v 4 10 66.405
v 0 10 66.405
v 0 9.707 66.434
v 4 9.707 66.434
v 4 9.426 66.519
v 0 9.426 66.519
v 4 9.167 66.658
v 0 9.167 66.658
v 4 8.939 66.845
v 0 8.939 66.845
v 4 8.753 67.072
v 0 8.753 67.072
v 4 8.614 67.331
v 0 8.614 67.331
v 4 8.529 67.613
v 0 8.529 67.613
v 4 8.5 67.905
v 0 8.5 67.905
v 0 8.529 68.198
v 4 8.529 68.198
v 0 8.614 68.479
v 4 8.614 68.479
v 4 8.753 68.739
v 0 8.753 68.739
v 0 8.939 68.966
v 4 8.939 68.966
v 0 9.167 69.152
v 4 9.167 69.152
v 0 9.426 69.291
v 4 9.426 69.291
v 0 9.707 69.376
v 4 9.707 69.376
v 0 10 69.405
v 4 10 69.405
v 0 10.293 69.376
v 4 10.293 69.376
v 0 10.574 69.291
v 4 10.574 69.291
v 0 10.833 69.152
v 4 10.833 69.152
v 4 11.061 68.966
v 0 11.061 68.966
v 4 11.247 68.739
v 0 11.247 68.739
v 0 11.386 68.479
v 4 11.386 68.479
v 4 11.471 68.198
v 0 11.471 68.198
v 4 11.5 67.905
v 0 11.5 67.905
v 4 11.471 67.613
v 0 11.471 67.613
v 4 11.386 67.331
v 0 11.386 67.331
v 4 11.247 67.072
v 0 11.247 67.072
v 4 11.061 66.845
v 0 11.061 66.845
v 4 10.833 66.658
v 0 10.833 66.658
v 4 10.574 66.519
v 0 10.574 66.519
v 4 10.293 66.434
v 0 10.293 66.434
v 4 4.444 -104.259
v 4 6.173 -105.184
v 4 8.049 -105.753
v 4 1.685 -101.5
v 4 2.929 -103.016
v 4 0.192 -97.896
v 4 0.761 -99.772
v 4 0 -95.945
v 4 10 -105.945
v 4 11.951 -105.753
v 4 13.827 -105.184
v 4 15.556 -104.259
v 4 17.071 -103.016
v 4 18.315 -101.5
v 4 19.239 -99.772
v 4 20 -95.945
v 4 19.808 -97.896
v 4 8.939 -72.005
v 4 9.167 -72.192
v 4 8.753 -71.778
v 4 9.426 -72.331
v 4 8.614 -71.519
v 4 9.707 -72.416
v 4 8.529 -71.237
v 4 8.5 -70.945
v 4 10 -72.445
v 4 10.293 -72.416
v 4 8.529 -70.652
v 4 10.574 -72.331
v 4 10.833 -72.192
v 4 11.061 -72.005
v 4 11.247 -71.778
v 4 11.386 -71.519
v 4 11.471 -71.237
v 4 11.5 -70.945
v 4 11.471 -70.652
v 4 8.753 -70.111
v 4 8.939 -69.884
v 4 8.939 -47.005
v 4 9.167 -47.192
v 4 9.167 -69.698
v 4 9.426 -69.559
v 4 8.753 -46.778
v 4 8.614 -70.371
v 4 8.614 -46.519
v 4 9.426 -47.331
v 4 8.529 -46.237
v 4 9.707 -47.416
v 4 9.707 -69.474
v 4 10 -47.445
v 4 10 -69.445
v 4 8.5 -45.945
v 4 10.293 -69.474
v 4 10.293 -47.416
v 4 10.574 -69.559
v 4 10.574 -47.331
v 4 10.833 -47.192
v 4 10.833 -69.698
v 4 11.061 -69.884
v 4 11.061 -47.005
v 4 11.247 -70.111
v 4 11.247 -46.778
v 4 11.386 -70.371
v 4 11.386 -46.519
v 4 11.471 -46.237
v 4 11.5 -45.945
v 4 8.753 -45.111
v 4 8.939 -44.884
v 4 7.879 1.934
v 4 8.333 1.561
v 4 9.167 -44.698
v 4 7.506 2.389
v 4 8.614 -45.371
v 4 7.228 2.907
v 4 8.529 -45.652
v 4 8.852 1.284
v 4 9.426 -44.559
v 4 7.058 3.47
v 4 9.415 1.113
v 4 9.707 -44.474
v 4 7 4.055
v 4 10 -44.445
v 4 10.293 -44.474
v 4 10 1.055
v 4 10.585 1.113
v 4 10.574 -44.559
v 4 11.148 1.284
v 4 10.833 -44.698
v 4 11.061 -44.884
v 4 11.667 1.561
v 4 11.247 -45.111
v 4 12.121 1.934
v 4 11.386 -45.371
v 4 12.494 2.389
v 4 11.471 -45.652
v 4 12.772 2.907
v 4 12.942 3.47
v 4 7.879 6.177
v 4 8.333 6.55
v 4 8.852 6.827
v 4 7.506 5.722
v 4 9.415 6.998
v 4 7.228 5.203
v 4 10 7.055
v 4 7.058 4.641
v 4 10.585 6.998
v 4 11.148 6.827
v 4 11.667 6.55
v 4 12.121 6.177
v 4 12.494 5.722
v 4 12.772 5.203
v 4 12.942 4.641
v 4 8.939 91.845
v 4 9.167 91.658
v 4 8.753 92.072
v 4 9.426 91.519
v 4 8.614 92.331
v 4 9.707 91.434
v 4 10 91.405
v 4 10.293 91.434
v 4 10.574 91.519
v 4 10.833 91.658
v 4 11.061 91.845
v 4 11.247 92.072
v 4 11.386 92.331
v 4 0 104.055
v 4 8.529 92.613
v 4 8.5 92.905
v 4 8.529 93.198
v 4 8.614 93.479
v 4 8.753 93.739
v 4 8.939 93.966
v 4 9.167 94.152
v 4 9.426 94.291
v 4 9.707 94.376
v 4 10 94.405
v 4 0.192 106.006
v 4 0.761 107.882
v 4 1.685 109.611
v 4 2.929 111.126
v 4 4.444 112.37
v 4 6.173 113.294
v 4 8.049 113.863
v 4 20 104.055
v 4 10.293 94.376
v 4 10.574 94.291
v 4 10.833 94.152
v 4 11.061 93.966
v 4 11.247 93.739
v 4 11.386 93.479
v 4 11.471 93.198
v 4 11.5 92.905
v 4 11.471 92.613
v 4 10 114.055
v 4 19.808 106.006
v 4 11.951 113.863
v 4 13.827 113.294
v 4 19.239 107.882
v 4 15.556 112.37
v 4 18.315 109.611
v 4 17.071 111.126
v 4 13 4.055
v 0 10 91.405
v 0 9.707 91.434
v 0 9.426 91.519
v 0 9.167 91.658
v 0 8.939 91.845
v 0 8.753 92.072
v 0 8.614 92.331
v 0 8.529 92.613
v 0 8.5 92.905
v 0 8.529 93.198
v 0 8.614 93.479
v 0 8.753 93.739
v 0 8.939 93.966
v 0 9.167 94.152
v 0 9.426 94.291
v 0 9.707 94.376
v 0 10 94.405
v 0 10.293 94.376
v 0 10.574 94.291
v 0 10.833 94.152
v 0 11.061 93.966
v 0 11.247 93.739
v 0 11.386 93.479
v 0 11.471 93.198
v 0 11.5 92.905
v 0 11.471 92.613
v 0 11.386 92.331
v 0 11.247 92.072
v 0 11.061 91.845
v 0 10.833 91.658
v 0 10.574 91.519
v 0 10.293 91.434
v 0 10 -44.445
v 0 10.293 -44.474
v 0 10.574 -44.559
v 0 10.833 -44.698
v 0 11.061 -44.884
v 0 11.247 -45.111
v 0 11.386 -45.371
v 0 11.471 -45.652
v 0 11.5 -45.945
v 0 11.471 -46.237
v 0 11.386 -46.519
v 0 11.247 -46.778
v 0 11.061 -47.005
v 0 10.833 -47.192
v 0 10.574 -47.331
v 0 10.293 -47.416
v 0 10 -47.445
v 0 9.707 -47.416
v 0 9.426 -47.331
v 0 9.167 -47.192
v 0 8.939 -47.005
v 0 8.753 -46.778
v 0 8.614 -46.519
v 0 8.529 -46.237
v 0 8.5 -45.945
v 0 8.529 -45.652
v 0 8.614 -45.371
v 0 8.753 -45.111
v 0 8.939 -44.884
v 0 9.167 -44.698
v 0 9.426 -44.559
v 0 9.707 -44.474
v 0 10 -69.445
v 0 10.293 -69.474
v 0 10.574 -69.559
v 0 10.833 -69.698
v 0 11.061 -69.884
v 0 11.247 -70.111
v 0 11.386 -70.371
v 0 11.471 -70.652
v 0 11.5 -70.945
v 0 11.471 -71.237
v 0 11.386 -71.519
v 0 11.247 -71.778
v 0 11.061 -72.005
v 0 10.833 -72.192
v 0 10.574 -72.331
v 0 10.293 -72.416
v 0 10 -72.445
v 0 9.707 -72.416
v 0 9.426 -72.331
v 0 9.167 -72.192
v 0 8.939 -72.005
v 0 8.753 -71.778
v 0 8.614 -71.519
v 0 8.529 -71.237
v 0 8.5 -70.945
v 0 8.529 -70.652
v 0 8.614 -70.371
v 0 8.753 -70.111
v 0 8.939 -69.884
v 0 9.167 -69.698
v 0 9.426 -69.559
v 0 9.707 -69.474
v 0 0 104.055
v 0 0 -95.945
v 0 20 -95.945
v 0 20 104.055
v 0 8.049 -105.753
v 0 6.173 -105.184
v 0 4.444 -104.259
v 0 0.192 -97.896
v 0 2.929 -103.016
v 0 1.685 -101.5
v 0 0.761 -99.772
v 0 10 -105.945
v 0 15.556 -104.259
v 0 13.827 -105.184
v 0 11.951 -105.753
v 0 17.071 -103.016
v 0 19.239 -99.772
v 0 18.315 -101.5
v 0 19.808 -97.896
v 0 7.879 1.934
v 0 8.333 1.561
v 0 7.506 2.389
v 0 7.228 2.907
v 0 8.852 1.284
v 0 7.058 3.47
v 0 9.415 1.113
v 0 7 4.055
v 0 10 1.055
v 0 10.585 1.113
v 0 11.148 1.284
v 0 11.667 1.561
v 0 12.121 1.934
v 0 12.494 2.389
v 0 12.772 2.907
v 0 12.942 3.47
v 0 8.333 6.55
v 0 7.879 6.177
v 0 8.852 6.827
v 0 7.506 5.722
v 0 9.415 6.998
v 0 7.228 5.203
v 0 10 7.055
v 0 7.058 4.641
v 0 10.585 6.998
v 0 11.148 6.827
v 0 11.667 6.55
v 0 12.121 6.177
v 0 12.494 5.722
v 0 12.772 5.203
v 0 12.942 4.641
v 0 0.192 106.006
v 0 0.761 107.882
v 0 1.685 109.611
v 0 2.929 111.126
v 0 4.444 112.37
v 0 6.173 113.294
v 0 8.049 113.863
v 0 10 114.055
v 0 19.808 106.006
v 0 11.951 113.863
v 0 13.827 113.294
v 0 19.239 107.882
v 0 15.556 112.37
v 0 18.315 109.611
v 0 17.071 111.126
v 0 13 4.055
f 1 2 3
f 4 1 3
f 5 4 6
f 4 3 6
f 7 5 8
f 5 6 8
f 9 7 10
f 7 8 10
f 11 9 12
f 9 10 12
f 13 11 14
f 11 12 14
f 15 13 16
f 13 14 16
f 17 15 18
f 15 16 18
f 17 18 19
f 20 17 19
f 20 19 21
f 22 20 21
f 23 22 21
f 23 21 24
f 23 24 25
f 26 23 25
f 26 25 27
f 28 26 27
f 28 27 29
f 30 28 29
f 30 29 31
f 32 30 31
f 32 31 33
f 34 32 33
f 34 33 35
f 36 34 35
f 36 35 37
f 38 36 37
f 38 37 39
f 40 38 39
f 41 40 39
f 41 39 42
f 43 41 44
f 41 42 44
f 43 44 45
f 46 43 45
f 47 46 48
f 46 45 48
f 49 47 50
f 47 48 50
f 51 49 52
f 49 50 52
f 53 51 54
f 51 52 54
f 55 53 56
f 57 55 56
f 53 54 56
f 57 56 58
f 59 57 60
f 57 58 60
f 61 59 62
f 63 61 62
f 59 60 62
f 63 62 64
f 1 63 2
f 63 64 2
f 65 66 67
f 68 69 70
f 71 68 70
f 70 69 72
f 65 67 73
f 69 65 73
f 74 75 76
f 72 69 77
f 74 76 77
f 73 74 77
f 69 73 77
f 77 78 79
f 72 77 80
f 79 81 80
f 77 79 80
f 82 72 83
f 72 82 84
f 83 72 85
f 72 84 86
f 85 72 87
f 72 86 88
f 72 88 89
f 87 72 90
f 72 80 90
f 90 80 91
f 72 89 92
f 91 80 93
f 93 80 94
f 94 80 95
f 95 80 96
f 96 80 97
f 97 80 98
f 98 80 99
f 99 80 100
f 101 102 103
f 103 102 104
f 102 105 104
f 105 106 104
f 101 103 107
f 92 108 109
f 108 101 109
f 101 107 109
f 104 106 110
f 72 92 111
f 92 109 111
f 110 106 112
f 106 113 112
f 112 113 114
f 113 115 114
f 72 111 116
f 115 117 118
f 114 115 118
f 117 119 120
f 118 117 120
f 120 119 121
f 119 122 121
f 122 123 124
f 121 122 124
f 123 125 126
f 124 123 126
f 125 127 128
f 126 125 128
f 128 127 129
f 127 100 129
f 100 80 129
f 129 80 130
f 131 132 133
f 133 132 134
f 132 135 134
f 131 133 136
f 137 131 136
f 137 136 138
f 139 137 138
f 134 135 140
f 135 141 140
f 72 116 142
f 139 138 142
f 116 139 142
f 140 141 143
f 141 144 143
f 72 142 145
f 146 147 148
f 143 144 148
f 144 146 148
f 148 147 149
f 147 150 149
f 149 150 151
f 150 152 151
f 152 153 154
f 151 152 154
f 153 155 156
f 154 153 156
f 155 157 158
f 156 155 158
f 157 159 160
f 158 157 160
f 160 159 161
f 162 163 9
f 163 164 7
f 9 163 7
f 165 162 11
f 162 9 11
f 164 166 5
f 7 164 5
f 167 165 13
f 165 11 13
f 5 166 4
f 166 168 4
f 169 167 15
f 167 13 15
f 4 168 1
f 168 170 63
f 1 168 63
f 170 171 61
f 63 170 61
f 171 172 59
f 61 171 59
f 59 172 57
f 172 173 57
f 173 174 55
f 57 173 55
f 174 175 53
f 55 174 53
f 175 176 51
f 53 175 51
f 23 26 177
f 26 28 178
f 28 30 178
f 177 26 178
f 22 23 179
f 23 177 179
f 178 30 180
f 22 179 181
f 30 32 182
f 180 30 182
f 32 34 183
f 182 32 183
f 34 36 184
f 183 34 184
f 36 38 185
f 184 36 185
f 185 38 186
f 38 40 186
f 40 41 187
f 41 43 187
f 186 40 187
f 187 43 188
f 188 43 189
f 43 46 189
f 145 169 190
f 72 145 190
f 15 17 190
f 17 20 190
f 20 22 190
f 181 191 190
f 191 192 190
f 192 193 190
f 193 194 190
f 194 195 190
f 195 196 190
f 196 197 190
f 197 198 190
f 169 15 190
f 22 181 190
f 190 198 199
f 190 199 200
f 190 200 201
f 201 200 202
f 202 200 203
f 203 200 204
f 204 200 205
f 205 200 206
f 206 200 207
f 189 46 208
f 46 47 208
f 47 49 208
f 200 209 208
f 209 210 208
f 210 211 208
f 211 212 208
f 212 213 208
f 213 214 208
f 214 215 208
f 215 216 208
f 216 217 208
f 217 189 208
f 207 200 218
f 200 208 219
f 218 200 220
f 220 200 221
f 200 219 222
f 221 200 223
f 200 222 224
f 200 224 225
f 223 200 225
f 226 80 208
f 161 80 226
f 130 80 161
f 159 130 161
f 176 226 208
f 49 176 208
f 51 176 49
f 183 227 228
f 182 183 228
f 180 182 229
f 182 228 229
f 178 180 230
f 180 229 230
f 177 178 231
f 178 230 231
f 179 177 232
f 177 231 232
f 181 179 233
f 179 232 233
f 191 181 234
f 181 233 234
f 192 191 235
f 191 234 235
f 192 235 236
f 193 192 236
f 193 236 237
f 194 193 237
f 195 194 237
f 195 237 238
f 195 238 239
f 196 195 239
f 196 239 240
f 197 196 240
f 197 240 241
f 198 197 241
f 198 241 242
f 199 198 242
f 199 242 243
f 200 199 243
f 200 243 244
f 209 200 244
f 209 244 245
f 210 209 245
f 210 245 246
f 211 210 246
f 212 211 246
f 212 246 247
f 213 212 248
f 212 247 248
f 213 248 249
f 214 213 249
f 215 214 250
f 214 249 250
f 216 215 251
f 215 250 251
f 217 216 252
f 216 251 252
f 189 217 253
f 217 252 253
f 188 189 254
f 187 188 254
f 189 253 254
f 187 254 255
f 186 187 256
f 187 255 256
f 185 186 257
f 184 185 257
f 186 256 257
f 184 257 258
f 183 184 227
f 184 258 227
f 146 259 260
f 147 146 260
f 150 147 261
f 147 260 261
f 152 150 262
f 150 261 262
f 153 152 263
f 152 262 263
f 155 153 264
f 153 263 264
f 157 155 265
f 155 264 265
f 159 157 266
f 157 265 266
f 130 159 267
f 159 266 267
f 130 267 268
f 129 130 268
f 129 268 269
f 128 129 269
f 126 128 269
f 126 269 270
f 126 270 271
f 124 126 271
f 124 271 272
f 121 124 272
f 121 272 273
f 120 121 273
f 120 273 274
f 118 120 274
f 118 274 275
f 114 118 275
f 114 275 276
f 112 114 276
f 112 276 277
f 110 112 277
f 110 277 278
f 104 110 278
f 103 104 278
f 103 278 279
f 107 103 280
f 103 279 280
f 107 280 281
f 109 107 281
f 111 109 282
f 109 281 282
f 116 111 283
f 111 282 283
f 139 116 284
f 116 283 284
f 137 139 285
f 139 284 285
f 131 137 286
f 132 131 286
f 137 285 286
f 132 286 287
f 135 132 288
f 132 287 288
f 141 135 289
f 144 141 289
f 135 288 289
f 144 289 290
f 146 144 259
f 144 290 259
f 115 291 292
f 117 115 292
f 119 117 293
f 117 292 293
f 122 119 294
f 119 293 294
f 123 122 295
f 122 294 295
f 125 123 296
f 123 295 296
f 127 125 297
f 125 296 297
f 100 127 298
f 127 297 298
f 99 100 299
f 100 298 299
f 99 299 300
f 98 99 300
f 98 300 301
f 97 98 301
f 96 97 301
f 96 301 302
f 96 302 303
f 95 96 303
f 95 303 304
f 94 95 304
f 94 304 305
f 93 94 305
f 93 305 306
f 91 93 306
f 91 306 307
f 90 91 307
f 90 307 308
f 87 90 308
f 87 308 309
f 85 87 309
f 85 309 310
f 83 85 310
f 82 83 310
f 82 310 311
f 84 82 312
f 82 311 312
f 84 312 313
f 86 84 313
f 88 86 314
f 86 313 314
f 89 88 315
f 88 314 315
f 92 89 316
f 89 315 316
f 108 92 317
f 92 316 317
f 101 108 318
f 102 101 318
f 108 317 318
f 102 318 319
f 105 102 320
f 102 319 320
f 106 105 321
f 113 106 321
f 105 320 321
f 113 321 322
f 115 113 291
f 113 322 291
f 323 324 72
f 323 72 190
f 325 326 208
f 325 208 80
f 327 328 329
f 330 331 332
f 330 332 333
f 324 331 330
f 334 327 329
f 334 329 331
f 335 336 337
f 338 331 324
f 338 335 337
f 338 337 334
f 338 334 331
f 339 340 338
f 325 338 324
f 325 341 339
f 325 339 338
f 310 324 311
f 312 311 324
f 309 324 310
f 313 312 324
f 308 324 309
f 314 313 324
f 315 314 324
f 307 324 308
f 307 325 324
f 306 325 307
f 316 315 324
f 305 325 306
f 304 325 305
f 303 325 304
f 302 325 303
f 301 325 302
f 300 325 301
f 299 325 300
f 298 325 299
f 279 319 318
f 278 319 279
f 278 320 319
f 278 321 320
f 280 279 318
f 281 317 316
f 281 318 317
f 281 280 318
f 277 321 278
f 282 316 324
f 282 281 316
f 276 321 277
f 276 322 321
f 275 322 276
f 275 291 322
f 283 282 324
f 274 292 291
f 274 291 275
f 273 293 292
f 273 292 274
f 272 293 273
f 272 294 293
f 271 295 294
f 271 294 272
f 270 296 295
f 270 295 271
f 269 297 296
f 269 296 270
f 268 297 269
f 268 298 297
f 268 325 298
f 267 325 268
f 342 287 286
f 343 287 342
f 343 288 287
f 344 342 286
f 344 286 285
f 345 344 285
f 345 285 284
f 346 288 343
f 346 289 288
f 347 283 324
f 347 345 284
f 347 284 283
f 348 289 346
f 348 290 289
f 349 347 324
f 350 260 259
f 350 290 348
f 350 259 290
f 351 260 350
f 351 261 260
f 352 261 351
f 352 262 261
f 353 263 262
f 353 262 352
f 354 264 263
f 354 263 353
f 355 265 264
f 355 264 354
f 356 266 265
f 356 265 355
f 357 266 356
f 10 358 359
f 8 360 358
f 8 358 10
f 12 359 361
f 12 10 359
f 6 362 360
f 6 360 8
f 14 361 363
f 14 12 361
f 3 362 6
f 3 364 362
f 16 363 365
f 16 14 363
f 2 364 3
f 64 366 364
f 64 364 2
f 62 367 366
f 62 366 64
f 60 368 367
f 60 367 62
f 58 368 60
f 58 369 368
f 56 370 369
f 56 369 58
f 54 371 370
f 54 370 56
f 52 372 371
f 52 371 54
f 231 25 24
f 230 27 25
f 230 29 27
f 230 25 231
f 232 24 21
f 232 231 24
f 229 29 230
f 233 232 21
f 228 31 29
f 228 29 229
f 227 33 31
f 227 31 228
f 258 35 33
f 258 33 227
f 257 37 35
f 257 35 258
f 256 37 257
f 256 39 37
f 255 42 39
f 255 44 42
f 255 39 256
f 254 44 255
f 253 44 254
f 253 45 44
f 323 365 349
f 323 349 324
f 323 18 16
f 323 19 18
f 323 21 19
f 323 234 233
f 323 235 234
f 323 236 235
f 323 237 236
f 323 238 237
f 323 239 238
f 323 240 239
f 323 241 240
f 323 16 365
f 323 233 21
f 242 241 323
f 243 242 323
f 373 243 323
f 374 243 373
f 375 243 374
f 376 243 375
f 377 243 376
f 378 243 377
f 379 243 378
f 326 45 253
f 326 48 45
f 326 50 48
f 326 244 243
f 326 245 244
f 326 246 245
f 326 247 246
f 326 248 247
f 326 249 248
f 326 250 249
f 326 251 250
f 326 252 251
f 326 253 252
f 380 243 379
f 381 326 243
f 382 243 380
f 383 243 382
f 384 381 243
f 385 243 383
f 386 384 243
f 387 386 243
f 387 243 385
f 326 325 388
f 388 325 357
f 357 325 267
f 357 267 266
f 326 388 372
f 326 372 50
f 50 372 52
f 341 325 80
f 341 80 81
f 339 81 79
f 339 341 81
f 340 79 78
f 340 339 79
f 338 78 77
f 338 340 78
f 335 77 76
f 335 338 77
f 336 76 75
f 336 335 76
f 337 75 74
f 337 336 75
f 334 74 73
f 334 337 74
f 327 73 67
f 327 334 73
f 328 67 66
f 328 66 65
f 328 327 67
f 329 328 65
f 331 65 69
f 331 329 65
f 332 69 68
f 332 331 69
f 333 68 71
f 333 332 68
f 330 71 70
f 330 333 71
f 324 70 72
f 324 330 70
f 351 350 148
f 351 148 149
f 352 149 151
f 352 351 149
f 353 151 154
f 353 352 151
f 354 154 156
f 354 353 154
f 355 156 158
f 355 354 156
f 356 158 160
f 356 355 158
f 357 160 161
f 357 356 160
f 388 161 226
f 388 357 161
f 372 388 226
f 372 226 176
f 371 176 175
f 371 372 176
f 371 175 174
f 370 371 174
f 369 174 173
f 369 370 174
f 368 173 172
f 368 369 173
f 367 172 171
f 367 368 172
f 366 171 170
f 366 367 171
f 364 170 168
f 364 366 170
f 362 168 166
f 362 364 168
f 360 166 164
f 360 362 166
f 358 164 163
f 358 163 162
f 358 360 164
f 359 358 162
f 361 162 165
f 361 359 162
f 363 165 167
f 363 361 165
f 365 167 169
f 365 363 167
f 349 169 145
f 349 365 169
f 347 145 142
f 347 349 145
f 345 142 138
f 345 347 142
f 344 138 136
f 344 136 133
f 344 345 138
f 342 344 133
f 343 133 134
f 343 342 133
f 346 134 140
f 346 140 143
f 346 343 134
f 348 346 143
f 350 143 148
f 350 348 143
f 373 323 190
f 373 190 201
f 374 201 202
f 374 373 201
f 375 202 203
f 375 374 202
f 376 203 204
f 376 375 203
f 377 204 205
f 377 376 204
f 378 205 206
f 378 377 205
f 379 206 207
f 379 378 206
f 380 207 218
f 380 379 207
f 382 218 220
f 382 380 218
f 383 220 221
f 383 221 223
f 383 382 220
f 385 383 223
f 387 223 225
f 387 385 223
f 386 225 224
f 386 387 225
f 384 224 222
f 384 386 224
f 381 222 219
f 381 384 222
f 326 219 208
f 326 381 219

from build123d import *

# Parameters (mm, degrees)
CROQUIS1_R              = 3
SALIENTE_EXTRUIR1_DEPTH = 4
CROQUIS5_R              = 1.5
CORTAR_EXTRUIR4_DEPTH   = 65


with BuildPart() as part:
    # Croquis1 → Saliente-Extruir1 (new body)
    with BuildSketch(Plane(origin=(0, 0, 0), x_dir=(0, 0, -1), z_dir=(1, 0, 0))):
        with BuildLine():
            Line((0, 0), (-104.055250837, 0))
            ThreePointArc((-104.055250837, 0), (-114.055250837, 10), (-104.055250837, 20))
            Line((-104.055250837, 20), (0, 20))
            Line((0, 20), (95.944749163, 20))
            ThreePointArc((95.944749163, 20), (105.944749163, 10), (95.944749163, 0))
            Line((95.944749163, 0), (0, 0))
        make_face()
        with Locations((-4.055250837, 10)):
            Circle(CROQUIS1_R, mode=Mode.SUBTRACT)
    extrude(amount=SALIENTE_EXTRUIR1_DEPTH)

    # Croquis5 → Cortar-Extruir4 (cut)
    with BuildSketch(Plane.ZY):
        with Locations((-70.944749163, 10)):
            Circle(CROQUIS5_R)
        with Locations((-45.944749163, 10)):
            Circle(CROQUIS5_R)
        with Locations(Location((67.905250837, 10, 0), (0, 0, 180))):
            Circle(CROQUIS5_R)
        with Locations(Location((92.905250837, 10, 0), (0, 0, 180))):
            Circle(CROQUIS5_R)
    extrude(amount=-CORTAR_EXTRUIR4_DEPTH, mode=Mode.SUBTRACT)


solid = part.part
